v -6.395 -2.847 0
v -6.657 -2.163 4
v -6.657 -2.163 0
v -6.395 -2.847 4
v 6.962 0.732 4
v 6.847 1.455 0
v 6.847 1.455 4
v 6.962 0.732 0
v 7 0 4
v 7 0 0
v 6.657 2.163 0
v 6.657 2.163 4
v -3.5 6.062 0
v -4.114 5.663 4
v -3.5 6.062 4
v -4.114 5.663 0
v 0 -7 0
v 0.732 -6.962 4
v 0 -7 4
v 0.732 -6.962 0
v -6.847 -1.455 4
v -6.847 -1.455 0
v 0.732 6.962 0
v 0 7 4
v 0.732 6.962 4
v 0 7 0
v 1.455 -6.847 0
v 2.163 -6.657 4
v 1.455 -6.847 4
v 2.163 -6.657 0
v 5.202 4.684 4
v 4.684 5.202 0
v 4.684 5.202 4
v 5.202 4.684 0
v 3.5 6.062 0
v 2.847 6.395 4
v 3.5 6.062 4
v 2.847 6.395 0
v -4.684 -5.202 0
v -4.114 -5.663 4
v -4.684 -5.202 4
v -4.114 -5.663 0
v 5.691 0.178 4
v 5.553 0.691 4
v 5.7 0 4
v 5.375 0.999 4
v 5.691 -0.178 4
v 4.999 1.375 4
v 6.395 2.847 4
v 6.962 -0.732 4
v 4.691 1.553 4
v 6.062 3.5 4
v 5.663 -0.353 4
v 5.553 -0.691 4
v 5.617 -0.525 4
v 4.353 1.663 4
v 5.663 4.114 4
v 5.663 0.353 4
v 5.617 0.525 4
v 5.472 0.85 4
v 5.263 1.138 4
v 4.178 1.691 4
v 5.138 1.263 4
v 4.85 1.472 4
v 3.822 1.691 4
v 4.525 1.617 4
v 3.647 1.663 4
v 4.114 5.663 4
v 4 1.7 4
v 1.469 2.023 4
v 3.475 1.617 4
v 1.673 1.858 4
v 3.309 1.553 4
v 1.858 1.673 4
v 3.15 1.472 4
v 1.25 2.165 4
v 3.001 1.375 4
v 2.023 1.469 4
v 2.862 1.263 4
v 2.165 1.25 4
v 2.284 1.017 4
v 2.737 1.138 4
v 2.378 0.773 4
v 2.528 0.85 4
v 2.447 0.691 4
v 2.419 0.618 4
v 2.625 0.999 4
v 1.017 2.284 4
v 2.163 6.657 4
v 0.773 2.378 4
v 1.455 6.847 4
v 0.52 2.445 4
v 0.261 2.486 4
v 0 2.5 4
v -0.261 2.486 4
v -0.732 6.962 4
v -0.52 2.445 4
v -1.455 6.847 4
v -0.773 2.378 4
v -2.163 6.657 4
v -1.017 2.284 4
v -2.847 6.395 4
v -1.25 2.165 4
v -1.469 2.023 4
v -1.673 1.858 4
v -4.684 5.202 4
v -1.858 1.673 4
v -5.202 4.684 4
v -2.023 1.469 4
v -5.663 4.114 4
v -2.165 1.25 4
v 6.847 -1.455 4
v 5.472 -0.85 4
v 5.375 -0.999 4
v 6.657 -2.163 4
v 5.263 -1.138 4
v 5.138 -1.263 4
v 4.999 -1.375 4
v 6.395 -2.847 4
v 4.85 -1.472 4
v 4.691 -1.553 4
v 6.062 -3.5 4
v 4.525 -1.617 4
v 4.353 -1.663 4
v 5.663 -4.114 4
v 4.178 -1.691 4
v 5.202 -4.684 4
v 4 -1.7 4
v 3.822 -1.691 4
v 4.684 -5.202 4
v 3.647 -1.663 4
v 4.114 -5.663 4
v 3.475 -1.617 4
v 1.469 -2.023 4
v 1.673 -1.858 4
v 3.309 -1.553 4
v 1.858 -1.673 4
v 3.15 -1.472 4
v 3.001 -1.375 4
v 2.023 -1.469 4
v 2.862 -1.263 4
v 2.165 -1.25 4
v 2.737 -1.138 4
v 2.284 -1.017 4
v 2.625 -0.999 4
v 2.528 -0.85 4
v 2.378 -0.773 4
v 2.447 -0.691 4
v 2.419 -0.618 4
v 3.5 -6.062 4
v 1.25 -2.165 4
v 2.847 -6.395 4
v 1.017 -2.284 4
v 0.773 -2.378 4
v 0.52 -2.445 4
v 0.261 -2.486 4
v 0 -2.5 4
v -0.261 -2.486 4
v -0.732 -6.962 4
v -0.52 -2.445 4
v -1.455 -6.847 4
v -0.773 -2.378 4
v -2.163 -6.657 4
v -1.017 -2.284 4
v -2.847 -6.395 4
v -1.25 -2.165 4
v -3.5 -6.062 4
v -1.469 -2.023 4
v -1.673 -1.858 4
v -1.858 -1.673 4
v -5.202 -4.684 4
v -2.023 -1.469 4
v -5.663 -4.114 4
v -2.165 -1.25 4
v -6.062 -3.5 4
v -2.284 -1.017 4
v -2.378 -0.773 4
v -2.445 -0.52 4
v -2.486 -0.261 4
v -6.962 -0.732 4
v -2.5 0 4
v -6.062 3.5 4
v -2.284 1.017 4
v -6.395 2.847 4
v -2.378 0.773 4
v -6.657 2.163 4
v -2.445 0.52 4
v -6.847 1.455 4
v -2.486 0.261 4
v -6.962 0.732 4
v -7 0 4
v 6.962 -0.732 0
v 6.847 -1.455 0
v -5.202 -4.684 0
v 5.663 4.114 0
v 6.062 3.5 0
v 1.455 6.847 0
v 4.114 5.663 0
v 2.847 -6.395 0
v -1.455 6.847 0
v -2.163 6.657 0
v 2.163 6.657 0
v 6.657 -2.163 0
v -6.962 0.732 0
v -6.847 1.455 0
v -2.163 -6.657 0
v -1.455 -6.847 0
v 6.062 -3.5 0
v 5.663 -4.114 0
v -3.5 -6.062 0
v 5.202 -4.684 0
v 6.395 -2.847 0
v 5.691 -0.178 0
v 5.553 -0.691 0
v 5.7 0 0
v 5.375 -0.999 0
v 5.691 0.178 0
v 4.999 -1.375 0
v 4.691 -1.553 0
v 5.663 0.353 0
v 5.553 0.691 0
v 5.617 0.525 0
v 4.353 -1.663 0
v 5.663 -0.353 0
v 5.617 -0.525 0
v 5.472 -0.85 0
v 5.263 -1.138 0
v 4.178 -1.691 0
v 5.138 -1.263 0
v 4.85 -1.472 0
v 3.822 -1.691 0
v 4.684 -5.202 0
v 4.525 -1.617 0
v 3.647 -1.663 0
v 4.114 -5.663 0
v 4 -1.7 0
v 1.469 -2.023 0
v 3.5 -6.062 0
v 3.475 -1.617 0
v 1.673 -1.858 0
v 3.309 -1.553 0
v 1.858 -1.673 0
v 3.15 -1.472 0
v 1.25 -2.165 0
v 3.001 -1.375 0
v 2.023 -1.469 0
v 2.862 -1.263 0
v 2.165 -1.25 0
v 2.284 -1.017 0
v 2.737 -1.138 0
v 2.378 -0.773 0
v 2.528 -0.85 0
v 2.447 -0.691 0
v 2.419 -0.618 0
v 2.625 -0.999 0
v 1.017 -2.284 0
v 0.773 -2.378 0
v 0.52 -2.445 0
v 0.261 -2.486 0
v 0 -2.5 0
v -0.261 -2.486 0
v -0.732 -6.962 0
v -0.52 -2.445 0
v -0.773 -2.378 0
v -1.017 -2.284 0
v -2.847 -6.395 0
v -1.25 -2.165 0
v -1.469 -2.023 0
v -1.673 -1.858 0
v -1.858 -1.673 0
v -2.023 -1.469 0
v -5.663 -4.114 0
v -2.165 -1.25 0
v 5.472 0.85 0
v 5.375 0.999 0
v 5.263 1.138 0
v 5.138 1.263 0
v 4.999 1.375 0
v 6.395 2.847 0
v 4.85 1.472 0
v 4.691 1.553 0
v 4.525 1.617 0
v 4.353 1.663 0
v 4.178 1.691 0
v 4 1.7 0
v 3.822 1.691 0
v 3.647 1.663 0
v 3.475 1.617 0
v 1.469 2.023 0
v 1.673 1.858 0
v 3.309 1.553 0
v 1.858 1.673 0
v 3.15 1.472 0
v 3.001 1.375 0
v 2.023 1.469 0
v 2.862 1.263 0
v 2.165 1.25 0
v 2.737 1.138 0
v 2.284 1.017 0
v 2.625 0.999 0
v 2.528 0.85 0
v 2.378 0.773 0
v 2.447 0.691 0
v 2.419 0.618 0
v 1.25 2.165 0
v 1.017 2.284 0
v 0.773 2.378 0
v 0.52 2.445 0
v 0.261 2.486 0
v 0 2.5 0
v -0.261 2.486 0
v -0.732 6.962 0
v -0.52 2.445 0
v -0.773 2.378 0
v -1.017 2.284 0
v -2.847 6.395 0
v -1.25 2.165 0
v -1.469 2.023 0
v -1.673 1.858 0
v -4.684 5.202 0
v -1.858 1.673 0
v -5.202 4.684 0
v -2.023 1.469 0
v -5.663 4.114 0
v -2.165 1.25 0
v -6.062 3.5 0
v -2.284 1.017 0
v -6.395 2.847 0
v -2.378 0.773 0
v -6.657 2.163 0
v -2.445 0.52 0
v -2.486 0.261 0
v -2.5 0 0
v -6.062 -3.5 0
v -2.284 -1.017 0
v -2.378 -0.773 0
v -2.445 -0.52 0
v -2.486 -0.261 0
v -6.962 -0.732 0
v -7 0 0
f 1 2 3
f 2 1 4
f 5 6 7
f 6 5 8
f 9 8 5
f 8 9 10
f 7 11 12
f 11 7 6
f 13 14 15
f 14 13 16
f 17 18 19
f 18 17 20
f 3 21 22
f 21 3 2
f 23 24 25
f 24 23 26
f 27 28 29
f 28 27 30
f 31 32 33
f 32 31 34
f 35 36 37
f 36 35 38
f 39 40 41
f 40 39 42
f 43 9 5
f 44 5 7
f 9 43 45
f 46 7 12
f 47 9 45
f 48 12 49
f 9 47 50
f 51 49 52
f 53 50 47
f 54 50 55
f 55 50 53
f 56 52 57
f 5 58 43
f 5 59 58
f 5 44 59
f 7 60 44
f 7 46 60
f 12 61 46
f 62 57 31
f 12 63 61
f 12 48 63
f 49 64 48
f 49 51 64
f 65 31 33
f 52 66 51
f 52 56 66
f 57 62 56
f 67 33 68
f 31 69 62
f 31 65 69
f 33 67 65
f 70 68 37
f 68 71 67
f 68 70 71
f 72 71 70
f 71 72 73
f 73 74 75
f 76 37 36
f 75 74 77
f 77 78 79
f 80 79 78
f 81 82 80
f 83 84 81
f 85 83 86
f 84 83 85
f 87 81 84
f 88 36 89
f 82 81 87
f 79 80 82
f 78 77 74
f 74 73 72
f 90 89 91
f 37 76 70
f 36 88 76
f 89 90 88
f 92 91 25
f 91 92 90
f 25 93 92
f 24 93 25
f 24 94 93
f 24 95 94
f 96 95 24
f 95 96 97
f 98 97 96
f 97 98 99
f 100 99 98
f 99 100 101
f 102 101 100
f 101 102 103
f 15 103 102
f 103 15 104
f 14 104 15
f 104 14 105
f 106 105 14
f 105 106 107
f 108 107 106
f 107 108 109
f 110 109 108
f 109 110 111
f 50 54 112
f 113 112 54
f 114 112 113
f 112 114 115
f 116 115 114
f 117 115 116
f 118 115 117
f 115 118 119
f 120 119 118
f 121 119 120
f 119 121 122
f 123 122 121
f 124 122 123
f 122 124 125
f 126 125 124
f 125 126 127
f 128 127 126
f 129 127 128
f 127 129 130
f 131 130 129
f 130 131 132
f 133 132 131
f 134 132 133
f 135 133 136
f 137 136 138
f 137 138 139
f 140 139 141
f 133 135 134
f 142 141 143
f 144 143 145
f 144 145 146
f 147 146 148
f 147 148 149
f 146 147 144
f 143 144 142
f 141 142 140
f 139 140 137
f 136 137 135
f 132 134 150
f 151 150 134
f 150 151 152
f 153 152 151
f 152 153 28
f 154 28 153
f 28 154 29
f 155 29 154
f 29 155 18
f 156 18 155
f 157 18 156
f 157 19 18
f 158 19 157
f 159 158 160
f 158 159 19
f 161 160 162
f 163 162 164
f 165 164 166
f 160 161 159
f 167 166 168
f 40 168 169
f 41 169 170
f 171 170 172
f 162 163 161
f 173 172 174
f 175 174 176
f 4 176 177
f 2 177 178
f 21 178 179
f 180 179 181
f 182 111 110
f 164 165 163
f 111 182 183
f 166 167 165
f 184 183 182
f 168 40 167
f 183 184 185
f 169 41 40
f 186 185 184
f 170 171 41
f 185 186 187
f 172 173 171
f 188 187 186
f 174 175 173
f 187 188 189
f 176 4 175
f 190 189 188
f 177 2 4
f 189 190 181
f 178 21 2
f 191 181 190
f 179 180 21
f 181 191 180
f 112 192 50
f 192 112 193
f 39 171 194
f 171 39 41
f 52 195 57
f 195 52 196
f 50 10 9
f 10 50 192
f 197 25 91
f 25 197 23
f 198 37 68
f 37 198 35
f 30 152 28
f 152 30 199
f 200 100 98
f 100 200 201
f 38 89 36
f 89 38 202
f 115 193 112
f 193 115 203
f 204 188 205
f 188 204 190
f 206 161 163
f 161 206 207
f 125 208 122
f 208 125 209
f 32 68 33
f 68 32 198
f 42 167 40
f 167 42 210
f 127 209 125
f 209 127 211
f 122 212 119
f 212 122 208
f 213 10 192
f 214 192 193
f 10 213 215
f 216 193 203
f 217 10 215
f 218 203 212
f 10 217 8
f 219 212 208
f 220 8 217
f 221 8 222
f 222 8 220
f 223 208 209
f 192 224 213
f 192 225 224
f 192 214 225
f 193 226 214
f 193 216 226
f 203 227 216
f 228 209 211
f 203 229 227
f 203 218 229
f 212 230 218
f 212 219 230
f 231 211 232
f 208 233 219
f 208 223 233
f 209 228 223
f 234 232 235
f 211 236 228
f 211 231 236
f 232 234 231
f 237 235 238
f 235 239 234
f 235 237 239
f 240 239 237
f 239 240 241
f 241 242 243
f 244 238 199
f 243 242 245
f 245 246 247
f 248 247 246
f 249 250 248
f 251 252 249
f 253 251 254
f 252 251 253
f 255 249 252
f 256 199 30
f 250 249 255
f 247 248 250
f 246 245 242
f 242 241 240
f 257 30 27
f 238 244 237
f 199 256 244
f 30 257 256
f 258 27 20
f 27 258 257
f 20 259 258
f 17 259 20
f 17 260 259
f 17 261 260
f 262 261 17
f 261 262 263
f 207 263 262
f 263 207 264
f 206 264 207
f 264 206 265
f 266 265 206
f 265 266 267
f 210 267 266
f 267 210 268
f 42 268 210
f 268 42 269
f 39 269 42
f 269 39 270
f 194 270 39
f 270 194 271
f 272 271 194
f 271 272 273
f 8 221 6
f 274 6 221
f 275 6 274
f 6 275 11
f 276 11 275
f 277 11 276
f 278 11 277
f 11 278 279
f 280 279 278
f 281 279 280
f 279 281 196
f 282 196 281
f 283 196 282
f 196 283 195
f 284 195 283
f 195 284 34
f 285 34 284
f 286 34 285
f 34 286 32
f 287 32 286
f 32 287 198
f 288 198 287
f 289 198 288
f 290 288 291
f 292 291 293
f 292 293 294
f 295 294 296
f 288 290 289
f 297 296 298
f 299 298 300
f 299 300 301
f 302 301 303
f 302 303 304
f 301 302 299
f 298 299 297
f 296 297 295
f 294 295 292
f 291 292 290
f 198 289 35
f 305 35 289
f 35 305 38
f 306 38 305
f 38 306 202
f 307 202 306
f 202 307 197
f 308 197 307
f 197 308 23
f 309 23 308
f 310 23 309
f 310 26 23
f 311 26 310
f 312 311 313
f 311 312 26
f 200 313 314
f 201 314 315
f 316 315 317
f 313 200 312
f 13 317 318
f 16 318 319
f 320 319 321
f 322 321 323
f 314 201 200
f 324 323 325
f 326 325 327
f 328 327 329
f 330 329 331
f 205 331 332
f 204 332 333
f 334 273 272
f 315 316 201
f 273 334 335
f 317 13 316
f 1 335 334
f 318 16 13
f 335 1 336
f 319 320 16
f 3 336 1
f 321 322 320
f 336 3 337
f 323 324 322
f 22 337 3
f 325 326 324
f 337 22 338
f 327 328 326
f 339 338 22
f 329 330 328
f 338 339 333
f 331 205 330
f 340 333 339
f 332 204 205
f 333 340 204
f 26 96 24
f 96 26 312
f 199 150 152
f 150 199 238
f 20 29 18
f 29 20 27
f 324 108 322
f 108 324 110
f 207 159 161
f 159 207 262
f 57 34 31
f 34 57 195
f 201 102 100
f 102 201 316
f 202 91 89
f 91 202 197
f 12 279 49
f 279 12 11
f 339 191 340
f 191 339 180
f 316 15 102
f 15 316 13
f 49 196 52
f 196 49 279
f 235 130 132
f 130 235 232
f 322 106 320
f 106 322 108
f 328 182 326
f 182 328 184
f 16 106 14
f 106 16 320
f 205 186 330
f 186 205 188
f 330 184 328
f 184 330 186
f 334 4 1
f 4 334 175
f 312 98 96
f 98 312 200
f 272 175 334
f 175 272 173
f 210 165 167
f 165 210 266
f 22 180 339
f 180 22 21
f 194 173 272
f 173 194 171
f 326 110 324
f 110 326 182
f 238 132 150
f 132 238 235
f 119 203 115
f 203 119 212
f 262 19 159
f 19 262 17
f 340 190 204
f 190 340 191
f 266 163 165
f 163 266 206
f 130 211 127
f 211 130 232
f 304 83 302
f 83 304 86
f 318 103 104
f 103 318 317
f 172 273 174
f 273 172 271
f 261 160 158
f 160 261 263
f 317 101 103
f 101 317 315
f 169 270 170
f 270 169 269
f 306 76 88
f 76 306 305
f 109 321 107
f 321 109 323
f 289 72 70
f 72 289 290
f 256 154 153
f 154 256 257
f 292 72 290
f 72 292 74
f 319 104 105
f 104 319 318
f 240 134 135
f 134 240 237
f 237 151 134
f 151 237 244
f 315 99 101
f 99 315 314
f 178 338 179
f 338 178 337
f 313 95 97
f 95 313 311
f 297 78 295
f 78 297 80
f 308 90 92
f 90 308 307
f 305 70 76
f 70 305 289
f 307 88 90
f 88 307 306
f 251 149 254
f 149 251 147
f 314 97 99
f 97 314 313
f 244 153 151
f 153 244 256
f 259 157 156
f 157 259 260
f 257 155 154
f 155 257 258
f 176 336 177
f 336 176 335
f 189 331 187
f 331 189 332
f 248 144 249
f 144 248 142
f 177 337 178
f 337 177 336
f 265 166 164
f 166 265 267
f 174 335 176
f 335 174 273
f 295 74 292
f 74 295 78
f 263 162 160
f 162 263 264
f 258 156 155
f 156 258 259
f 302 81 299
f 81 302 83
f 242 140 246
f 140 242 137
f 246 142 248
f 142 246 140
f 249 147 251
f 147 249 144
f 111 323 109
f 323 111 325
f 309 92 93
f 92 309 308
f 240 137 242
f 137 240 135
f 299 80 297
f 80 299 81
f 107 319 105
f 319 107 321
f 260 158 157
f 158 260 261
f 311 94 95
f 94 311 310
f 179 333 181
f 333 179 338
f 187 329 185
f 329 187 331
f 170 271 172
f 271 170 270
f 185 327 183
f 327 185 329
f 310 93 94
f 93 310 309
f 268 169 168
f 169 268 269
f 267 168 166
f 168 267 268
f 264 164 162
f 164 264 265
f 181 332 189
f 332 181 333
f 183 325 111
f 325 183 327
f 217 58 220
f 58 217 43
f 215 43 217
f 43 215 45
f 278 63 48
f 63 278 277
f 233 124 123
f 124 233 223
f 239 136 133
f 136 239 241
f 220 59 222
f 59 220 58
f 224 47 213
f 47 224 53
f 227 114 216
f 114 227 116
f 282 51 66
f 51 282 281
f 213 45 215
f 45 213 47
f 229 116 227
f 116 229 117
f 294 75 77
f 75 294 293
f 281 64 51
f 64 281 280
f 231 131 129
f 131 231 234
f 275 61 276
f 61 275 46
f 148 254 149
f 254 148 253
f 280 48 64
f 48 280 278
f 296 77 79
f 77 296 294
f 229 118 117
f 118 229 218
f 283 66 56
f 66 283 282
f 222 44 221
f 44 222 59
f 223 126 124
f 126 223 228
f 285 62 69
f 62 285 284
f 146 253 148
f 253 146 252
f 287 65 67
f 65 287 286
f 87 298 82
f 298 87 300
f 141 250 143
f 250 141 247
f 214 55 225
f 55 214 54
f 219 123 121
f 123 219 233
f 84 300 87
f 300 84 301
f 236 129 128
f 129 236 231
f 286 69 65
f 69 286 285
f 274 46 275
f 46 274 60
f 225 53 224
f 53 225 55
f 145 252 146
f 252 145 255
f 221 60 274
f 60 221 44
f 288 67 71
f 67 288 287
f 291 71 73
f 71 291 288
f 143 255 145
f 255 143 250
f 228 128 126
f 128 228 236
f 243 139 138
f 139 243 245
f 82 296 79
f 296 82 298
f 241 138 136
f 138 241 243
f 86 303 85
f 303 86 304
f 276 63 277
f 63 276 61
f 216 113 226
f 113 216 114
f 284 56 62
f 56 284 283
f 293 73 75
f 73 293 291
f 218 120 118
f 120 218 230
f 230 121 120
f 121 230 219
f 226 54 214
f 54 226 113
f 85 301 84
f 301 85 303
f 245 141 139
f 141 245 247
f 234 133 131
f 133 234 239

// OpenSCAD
// Closed cable guide ring.
$fn = 60;
eps = 0.02;
cable_d = 5;
outer_d = 14;
thickness = 4;
difference() { cylinder(d=outer_d,h=thickness); translate([0,0,-eps]) cylinder(d=cable_d,h=thickness+2*eps); translate([outer_d/2-3,0,-eps]) cylinder(d=3.4,h=thickness+2*eps); }
